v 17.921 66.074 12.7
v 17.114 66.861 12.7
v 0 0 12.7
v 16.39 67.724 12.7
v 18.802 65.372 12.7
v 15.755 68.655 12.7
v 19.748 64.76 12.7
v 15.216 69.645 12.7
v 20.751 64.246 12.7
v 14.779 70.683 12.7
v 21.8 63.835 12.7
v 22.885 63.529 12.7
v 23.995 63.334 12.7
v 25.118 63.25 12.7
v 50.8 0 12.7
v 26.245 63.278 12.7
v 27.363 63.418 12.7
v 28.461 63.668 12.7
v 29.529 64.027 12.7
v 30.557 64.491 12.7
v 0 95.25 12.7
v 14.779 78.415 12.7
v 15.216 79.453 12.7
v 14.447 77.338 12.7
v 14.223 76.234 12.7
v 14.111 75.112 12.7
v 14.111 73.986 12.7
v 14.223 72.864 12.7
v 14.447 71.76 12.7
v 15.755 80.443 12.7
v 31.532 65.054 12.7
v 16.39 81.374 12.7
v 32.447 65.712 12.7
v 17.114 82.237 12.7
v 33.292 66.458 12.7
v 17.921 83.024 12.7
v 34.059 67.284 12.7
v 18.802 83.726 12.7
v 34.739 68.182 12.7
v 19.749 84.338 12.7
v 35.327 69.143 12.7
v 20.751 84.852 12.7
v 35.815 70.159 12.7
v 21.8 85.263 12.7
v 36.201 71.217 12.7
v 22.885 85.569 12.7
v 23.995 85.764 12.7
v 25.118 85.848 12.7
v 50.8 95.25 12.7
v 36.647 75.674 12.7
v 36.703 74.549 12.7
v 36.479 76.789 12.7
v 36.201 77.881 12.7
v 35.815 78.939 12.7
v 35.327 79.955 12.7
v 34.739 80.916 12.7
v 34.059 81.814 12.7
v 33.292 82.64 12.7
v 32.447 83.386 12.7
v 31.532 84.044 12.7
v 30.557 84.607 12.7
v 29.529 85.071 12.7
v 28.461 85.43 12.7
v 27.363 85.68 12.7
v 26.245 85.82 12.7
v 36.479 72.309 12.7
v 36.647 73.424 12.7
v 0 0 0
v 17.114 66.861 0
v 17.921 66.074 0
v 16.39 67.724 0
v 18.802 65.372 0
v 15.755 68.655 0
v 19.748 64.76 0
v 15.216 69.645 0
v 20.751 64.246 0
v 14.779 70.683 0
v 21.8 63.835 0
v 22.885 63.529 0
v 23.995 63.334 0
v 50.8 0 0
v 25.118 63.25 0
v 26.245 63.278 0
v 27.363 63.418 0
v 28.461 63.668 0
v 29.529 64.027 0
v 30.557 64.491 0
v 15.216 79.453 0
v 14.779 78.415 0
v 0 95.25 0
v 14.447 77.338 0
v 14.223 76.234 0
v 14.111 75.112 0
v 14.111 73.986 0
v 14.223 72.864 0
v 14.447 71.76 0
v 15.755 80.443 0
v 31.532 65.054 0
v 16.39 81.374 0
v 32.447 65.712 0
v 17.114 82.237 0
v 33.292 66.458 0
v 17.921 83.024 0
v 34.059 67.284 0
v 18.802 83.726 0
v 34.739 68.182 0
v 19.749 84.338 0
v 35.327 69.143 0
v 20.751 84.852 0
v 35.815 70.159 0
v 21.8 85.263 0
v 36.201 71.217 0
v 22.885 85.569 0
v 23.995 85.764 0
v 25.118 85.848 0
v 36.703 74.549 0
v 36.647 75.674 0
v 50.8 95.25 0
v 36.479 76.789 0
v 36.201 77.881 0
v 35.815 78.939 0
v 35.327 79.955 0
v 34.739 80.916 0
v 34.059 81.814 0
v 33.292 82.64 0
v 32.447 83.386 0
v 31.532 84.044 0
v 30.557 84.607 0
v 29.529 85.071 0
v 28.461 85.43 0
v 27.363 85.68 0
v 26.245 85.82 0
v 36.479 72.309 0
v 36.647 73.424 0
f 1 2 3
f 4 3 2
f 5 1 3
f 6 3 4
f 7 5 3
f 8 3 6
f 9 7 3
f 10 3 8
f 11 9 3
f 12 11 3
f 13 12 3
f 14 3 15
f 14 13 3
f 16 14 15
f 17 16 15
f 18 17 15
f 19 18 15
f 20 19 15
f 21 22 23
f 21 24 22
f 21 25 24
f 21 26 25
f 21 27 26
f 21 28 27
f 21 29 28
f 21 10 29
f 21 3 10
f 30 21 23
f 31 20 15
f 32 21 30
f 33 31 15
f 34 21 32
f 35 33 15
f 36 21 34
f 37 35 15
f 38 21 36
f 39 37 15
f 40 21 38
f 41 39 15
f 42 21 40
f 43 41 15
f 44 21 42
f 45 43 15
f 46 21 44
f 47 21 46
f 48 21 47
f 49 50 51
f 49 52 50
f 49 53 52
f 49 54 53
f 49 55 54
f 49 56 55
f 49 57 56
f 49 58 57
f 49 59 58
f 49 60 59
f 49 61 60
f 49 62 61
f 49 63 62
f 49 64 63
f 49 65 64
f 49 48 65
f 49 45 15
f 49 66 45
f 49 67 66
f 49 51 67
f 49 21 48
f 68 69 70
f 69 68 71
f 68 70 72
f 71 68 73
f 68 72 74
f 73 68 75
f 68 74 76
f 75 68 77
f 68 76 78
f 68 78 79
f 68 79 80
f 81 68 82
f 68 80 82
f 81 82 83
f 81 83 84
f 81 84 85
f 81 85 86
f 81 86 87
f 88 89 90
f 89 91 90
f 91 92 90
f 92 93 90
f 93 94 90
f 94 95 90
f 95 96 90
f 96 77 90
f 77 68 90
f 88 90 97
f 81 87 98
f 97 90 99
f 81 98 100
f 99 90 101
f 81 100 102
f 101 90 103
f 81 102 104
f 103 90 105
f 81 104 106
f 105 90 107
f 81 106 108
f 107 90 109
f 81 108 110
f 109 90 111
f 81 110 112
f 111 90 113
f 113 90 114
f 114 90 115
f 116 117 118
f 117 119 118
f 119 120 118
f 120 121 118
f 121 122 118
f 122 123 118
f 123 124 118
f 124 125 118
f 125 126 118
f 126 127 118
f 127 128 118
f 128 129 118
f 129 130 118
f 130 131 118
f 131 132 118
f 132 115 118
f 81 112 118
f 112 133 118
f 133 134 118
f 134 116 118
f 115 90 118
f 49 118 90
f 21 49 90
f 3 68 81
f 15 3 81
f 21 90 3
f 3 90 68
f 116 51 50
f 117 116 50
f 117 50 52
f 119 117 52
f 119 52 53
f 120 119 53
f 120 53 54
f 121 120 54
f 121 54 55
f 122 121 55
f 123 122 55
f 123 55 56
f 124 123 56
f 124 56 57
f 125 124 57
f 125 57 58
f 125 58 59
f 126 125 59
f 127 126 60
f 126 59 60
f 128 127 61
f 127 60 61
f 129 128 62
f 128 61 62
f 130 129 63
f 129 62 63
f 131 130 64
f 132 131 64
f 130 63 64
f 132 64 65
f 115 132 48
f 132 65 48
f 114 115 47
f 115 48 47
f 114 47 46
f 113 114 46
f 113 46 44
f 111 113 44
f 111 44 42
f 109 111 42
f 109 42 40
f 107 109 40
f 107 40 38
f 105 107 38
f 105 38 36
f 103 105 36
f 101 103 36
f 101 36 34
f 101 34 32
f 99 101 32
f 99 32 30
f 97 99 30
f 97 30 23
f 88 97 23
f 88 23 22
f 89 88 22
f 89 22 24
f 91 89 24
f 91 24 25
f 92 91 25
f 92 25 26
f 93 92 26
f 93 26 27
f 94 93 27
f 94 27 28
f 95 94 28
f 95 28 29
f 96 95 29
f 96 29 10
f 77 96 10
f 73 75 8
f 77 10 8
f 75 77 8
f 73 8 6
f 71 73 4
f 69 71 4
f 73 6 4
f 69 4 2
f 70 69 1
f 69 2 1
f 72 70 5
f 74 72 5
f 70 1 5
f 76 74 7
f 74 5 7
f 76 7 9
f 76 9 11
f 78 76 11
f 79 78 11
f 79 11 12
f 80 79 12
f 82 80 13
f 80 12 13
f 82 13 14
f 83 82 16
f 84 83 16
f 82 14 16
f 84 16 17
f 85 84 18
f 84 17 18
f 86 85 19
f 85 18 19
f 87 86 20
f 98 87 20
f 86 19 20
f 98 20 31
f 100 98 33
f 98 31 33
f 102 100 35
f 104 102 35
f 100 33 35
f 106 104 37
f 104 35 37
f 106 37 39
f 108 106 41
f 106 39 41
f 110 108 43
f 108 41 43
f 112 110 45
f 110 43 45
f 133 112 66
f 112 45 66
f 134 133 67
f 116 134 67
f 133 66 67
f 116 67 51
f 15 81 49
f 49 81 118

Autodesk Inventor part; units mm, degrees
ref_plane "YZ Plane" through (0, 0, 0) normal (1, 0, 0) x (0, 1, 0)
ref_plane "XZ Plane" through (0, 0, 0) normal (0, 1, 0) x (-1, 0, 0)
ref_plane "XY Plane" through (0, 0, 0) normal (0, 0, 1) x (1, 0, 0)
sketch "Sketch1" plane through (0, 0, 0) normal (0, 0, 1) x (1, 0, 0)
  line L0 (0, 0) -> (50.8, 0)
  line L1 (50.8, 0) -> (50.8, 95.25)
  line L2 (50.8, 95.25) -> (0, 95.25)
  line L3 (0, 95.25) -> (0, 0)
  dimension "d0" = 50.8
  dimension "d1" = 95.25
extrude "Extrusion1" add sketch "Sketch1" along normal blind 12.7
sketch "Sketch2" plane through (0, 0, 12.7) normal (0, 0, 1) x (1, 0, 0)
  line L0 (0, 0) -> (50.8, 0) projected
  circle A0 centre (25.4, 74.549) radius 11.303
  dimension "d4" = 74.549
  dimension "d5" = 22.606
extrude "Extrusion2" cut sketch "Sketch2" against normal blind 12.7
properties part number "2f1ah" material "PBT Plastic"
